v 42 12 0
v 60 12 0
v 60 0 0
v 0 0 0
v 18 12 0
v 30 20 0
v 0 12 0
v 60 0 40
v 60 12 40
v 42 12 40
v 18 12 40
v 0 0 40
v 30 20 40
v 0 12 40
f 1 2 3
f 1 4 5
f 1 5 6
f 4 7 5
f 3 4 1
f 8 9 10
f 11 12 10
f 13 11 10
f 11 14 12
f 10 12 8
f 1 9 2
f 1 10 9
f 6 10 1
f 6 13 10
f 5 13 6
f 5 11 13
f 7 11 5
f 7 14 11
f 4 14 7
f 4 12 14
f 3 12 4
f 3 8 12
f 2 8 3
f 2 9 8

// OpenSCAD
$fn = 32;

// ----------------------------------------------------------------------
// V guide rail: vrib, 60 mm wide
// ----------------------------------------------------------------------

// --- parameters (mm) ---
rail_w = 60;              // rail width, X
base_t = 12;              // base plate thickness
v_depth = 8;              // V feature depth / height
v_half_w = 12;            // half width of the V at the base face
plate_t = 40;             // rail length, Z (the extrusion height)

profile = [[0, 0], [60, 0], [60, 12], [42, 12], [30, 20], [18, 12], [0, 12]];  // primary outline, 7 points, counter clockwise

// --- the one profile operation ---
linear_extrude(height = plate_t) polygon(points = profile);
